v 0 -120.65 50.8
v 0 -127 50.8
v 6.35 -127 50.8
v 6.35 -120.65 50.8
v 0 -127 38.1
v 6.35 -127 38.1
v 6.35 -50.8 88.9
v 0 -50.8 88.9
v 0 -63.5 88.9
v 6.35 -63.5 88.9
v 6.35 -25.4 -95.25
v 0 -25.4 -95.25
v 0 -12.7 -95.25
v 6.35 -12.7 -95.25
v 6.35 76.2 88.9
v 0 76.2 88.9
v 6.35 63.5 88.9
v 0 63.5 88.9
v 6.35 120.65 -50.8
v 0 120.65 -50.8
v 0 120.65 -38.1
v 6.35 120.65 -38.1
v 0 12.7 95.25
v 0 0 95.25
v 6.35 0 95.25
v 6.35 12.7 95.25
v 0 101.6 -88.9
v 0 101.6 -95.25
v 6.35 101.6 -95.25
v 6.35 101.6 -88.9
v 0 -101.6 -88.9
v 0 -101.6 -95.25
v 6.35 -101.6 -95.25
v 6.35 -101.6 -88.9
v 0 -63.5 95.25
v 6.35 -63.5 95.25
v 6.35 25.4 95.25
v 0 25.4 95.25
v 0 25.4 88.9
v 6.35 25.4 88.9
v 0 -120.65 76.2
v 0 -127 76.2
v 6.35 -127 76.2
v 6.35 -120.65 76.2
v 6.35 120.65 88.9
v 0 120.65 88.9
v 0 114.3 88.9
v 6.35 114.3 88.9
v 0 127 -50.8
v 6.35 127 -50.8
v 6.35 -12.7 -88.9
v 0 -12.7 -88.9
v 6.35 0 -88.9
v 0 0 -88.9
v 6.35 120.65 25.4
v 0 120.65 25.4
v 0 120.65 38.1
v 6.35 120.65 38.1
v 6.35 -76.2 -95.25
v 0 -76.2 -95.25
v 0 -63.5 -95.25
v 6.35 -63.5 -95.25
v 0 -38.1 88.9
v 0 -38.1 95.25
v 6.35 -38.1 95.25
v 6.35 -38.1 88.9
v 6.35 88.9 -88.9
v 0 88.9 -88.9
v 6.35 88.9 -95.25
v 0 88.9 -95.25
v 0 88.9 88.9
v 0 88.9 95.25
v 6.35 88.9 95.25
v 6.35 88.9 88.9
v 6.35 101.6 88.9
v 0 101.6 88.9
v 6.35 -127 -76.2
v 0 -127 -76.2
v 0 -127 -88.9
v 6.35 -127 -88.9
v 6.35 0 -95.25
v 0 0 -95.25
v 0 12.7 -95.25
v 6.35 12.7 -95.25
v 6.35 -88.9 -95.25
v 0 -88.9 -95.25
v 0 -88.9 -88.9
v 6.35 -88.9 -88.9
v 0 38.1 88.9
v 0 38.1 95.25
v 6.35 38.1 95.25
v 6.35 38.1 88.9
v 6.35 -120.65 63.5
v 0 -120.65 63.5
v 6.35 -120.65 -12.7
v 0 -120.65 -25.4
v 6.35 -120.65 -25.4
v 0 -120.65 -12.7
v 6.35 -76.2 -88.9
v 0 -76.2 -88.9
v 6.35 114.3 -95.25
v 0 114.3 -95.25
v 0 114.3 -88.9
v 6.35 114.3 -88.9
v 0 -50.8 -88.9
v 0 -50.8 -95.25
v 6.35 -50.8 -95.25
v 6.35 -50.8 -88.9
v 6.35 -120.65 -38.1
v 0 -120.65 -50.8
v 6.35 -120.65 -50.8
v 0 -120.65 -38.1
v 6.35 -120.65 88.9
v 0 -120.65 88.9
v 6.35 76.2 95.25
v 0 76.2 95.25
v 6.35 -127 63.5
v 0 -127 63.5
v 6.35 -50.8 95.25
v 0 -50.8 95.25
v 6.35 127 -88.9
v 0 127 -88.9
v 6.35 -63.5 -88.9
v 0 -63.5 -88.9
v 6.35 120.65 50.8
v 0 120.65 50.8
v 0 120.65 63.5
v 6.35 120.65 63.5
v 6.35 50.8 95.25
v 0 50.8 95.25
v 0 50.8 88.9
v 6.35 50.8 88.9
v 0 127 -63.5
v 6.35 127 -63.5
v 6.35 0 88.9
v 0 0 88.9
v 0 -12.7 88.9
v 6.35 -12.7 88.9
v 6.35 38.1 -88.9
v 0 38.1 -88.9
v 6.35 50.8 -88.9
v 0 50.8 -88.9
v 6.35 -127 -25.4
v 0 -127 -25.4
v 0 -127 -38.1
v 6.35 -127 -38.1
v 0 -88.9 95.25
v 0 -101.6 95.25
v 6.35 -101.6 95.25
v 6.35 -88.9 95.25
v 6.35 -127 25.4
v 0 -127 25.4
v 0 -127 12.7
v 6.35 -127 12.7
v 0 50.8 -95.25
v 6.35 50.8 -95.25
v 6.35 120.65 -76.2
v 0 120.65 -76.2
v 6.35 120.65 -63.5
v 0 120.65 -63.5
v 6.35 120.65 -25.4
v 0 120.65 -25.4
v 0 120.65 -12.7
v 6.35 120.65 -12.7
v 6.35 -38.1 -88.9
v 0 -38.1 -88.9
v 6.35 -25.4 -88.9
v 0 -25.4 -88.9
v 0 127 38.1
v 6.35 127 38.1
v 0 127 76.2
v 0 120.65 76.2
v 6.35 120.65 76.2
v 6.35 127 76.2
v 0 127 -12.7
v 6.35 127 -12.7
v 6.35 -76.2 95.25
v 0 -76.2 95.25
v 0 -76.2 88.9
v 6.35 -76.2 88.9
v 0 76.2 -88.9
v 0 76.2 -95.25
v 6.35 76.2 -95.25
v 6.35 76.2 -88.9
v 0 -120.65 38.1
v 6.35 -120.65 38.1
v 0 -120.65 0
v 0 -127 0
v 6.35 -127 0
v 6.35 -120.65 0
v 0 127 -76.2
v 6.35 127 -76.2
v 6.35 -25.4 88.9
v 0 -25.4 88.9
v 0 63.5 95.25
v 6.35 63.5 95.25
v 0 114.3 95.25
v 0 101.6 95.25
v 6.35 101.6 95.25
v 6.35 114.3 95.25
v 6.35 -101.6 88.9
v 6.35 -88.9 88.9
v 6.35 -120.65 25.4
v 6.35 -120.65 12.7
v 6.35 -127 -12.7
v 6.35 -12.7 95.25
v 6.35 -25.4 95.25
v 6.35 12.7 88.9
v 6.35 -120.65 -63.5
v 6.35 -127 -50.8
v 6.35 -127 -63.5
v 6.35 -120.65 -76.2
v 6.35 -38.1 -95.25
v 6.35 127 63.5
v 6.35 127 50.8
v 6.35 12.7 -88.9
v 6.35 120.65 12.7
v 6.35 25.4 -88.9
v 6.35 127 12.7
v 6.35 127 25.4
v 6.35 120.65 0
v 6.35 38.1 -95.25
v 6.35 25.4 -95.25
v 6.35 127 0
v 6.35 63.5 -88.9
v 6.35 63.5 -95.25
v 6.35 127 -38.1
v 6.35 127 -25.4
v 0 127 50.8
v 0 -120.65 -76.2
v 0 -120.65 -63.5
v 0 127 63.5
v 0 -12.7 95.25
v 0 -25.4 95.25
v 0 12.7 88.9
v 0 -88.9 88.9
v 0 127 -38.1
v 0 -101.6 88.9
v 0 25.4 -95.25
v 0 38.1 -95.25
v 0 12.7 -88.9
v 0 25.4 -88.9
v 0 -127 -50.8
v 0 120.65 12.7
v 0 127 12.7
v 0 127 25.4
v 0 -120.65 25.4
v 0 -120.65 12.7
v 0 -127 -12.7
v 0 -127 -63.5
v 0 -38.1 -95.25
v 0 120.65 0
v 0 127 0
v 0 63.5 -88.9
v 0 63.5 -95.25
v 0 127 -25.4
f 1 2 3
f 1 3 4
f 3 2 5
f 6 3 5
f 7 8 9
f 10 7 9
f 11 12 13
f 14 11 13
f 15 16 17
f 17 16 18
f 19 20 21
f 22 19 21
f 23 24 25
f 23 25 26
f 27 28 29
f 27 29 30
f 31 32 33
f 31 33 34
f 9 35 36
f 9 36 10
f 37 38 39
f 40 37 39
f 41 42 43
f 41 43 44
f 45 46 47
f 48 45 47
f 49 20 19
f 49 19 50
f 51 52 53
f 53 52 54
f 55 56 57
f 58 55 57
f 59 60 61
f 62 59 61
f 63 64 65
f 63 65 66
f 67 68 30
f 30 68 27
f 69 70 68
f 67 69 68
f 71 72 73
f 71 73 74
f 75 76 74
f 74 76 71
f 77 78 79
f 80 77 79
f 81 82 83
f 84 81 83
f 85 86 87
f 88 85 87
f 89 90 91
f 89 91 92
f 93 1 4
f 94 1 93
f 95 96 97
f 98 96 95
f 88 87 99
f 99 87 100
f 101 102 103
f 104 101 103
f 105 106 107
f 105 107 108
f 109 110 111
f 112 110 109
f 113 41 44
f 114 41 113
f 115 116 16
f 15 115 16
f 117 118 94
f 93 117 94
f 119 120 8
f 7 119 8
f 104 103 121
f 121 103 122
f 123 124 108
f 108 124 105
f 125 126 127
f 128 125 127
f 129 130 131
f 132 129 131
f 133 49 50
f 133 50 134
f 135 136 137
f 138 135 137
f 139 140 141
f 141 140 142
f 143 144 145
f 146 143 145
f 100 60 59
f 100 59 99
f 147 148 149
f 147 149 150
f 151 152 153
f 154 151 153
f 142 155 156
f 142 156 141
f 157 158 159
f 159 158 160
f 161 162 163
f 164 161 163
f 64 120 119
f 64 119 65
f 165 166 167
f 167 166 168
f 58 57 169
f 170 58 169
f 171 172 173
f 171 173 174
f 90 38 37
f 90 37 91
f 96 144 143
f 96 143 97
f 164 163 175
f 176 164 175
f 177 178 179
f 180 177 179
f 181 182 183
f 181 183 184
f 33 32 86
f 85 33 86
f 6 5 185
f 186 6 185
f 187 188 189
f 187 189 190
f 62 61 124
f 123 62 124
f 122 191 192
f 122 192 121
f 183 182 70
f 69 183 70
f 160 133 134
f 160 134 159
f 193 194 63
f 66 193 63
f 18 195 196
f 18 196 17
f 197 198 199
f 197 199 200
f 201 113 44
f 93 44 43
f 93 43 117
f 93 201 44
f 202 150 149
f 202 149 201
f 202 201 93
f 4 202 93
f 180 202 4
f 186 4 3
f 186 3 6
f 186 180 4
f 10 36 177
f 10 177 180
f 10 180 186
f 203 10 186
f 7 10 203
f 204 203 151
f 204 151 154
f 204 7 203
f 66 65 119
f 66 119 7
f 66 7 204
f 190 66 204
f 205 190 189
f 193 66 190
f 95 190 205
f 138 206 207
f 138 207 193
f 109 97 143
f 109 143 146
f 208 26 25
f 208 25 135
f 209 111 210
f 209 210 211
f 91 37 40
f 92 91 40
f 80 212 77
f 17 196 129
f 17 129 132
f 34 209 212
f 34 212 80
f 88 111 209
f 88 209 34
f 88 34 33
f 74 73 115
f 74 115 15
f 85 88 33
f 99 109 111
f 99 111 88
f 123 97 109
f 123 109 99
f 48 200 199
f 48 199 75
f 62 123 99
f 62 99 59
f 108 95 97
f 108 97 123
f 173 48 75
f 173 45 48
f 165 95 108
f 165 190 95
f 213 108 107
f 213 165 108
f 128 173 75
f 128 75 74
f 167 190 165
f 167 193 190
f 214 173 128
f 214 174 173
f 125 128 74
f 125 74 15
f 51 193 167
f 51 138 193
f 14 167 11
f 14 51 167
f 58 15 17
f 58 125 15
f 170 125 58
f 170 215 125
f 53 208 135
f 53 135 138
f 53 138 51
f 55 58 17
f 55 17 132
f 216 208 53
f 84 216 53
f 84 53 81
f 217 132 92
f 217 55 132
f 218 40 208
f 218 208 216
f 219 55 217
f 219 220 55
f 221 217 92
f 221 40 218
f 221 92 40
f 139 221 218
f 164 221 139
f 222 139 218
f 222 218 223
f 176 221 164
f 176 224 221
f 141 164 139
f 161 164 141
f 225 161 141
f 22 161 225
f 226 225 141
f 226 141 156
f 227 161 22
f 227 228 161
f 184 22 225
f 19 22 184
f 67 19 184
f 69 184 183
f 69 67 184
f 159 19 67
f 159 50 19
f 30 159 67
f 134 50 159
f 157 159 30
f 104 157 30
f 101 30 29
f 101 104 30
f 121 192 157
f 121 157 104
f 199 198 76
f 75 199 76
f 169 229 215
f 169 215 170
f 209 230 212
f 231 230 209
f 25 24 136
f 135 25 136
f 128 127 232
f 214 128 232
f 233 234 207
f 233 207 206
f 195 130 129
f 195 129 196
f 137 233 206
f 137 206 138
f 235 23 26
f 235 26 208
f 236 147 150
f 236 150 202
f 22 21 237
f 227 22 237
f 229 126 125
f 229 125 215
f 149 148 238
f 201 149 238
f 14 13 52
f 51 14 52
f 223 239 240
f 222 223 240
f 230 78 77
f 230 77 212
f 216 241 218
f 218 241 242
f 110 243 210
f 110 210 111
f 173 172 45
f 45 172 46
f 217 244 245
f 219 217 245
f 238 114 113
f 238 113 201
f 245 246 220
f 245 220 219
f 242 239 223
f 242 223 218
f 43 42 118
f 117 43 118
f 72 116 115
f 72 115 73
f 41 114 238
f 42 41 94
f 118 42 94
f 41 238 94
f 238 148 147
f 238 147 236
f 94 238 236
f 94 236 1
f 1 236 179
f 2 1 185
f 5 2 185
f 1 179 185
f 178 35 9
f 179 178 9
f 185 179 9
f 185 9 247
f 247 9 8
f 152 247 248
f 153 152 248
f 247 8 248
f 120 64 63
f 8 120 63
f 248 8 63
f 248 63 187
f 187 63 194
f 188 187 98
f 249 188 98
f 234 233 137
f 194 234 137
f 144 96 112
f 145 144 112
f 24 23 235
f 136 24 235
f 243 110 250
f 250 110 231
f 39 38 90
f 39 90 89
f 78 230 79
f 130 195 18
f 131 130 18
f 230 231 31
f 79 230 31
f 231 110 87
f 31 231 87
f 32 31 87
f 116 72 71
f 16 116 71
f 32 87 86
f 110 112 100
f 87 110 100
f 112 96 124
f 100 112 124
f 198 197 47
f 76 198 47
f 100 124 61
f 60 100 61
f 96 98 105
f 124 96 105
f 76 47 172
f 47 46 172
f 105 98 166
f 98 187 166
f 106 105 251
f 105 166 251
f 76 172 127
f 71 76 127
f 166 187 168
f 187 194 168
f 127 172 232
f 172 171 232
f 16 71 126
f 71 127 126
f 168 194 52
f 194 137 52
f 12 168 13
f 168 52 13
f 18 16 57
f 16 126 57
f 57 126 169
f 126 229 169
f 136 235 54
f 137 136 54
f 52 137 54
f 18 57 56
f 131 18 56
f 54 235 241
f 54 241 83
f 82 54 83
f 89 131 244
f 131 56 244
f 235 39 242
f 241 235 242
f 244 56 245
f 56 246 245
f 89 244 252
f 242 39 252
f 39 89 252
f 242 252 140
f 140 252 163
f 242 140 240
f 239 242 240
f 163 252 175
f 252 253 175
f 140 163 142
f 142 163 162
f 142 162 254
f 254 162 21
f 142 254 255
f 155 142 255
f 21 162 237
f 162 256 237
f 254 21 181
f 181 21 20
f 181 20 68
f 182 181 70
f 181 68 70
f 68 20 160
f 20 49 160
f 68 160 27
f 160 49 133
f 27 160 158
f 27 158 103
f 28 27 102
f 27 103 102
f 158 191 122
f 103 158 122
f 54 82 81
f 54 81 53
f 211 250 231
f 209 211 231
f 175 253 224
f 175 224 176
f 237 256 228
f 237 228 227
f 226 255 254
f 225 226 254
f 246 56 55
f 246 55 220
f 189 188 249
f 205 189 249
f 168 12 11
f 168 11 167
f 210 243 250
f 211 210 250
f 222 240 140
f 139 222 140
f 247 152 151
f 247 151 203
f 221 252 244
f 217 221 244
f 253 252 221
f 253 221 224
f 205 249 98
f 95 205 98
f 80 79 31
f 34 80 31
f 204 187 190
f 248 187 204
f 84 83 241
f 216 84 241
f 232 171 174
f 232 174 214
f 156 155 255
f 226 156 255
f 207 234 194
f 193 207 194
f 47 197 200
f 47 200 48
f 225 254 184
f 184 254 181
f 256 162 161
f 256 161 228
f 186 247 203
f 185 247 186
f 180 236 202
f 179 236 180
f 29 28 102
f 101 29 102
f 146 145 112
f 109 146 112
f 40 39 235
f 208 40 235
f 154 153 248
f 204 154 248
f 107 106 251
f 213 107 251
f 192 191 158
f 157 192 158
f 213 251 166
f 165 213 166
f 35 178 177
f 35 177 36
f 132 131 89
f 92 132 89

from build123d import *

# Parameters (mm, degrees)
SKETCH1_W               = 190.5
SKETCH1_H               = 254
BOSS_EXTRUDE1_DEPTH     = 6.35
SKETCH2_W               = 6.35
SKETCH2_H               = 12.7
CUT_EXTRUDE1_DEPTH      = 7.35
LPATTERN1_COUNT         = 9
LPATTERN1_PITCH         = 25.4
MIRROR1_COPY_1_SKETCH_W = 6.35
MIRROR1_COPY_1_SKETCH_H = 12.7
MIRROR1_COPY_1_DEPTH    = 7.35
MIRROR1_COPY_2_SKETCH_W = 6.35
MIRROR1_COPY_2_SKETCH_H = 12.7
MIRROR1_COPY_2_DEPTH    = 7.35
MIRROR1_COPY_3_SKETCH_W = 6.35
MIRROR1_COPY_3_SKETCH_H = 12.7
MIRROR1_COPY_3_DEPTH    = 7.35
MIRROR1_COPY_4_SKETCH_W = 6.35
MIRROR1_COPY_4_SKETCH_H = 12.7
MIRROR1_COPY_4_DEPTH    = 7.35
MIRROR1_COPY_5_SKETCH_W = 6.35
MIRROR1_COPY_5_SKETCH_H = 12.7
MIRROR1_COPY_5_DEPTH    = 7.35
MIRROR1_COPY_6_SKETCH_W = 6.35
MIRROR1_COPY_6_SKETCH_H = 12.7
MIRROR1_COPY_6_DEPTH    = 7.35
MIRROR1_COPY_7_SKETCH_W = 6.35
MIRROR1_COPY_7_SKETCH_H = 12.7
MIRROR1_COPY_7_DEPTH    = 7.35
MIRROR1_COPY_8_SKETCH_W = 6.35
MIRROR1_COPY_8_SKETCH_H = 12.7
MIRROR1_COPY_8_DEPTH    = 7.35
SKETCH3_W               = 12.7
SKETCH3_H               = 6.35
CUT_EXTRUDE2_DEPTH      = 7.35
LPATTERN2_COUNT         = 7
LPATTERN2_PITCH         = 25.4
MIRROR2_COPY_1_SKETCH_W = 12.7
MIRROR2_COPY_1_SKETCH_H = 6.35
MIRROR2_COPY_1_DEPTH    = 7.35
MIRROR2_COPY_2_SKETCH_W = 12.7
MIRROR2_COPY_2_SKETCH_H = 6.35
MIRROR2_COPY_2_DEPTH    = 7.35
MIRROR2_COPY_3_SKETCH_W = 12.7
MIRROR2_COPY_3_SKETCH_H = 6.35
MIRROR2_COPY_3_DEPTH    = 7.35
MIRROR2_COPY_4_SKETCH_W = 12.7
MIRROR2_COPY_4_SKETCH_H = 6.35
MIRROR2_COPY_4_DEPTH    = 7.35
MIRROR2_COPY_5_SKETCH_W = 12.7
MIRROR2_COPY_5_SKETCH_H = 6.35
MIRROR2_COPY_5_DEPTH    = 7.35
MIRROR2_COPY_6_SKETCH_W = 12.7
MIRROR2_COPY_6_SKETCH_H = 6.35
MIRROR2_COPY_6_DEPTH    = 7.35
SKETCH4_W               = 6.35
SKETCH4_H               = 25.4
CUT_EXTRUDE3_DEPTH      = 7.35


with BuildPart() as part:
    # Sketch1 → Boss-Extrude1 (new body)
    with BuildSketch(Plane(origin=(0, 0, 0), x_dir=(0, 0, -1), z_dir=(1, 0, 0))):
        Rectangle(SKETCH1_W, SKETCH1_H)
    extrude(amount=BOSS_EXTRUDE1_DEPTH)

    # Sketch2 → Cut-Extrude1 (cut, through all)
    with BuildSketch(Plane.ZY):
        with Locations((-92.075, -82.55)):
            Rectangle(SKETCH2_W, SKETCH2_H)
    cut_extrude1 = extrude(amount=-CUT_EXTRUDE1_DEPTH, mode=Mode.SUBTRACT)

    # LPattern1: Cut-Extrude1 ×9
    with Locations(*[(0, i * LPATTERN1_PITCH, 0) for i in range(1, LPATTERN1_COUNT)]):
        add(cut_extrude1, mode=Mode.SUBTRACT)

    # Mirror1: Cut-Extrude1 across plane
    add(cut_extrude1.mirror(Plane.XY), mode=Mode.SUBTRACT)

    # Mirror1 copy 1 sketch → Mirror1 copy 1 (cut, through all)
    with BuildSketch(Plane(origin=(0, 25.4, 0), x_dir=(0, 0, -1), z_dir=(-1, 0, 0))):
        with Locations((-92.075, 82.55)):
            Rectangle(MIRROR1_COPY_1_SKETCH_W, MIRROR1_COPY_1_SKETCH_H)
    extrude(amount=-MIRROR1_COPY_1_DEPTH, mode=Mode.SUBTRACT)

    # Mirror1 copy 2 sketch → Mirror1 copy 2 (cut, through all)
    with BuildSketch(Plane(origin=(0, 50.8, 0), x_dir=(0, 0, -1), z_dir=(-1, 0, 0))):
        with Locations((-92.075, 82.55)):
            Rectangle(MIRROR1_COPY_2_SKETCH_W, MIRROR1_COPY_2_SKETCH_H)
    extrude(amount=-MIRROR1_COPY_2_DEPTH, mode=Mode.SUBTRACT)

    # Mirror1 copy 3 sketch → Mirror1 copy 3 (cut, through all)
    with BuildSketch(Plane(origin=(0, 76.2, 0), x_dir=(0, 0, -1), z_dir=(-1, 0, 0))):
        with Locations((-92.075, 82.55)):
            Rectangle(MIRROR1_COPY_3_SKETCH_W, MIRROR1_COPY_3_SKETCH_H)
    extrude(amount=-MIRROR1_COPY_3_DEPTH, mode=Mode.SUBTRACT)

    # Mirror1 copy 4 sketch → Mirror1 copy 4 (cut, through all)
    with BuildSketch(Plane(origin=(0, 101.6, 0), x_dir=(0, 0, -1), z_dir=(-1, 0, 0))):
        with Locations((-92.075, 82.55)):
            Rectangle(MIRROR1_COPY_4_SKETCH_W, MIRROR1_COPY_4_SKETCH_H)
    extrude(amount=-MIRROR1_COPY_4_DEPTH, mode=Mode.SUBTRACT)

    # Mirror1 copy 5 sketch → Mirror1 copy 5 (cut, through all)
    with BuildSketch(Plane(origin=(0, 127, 0), x_dir=(0, 0, -1), z_dir=(-1, 0, 0))):
        with Locations((-92.075, 82.55)):
            Rectangle(MIRROR1_COPY_5_SKETCH_W, MIRROR1_COPY_5_SKETCH_H)
    extrude(amount=-MIRROR1_COPY_5_DEPTH, mode=Mode.SUBTRACT)

    # Mirror1 copy 6 sketch → Mirror1 copy 6 (cut, through all)
    with BuildSketch(Plane(origin=(0, 152.4, 0), x_dir=(0, 0, -1), z_dir=(-1, 0, 0))):
        with Locations((-92.075, 82.55)):
            Rectangle(MIRROR1_COPY_6_SKETCH_W, MIRROR1_COPY_6_SKETCH_H)
    extrude(amount=-MIRROR1_COPY_6_DEPTH, mode=Mode.SUBTRACT)

    # Mirror1 copy 7 sketch → Mirror1 copy 7 (cut, through all)
    with BuildSketch(Plane(origin=(0, 177.8, 0), x_dir=(0, 0, -1), z_dir=(-1, 0, 0))):
        with Locations((-92.075, 82.55)):
            Rectangle(MIRROR1_COPY_7_SKETCH_W, MIRROR1_COPY_7_SKETCH_H)
    extrude(amount=-MIRROR1_COPY_7_DEPTH, mode=Mode.SUBTRACT)

    # Mirror1 copy 8 sketch → Mirror1 copy 8 (cut, through all)
    with BuildSketch(Plane(origin=(0, 203.2, 0), x_dir=(0, 0, -1), z_dir=(-1, 0, 0))):
        with Locations((-92.075, 82.55)):
            Rectangle(MIRROR1_COPY_8_SKETCH_W, MIRROR1_COPY_8_SKETCH_H)
    extrude(amount=-MIRROR1_COPY_8_DEPTH, mode=Mode.SUBTRACT)

    # Sketch3 → Cut-Extrude2 (cut, through all)
    with BuildSketch(Plane.ZY):
        with Locations((-69.85, -123.825)):
            Rectangle(SKETCH3_W, SKETCH3_H)
    cut_extrude2 = extrude(amount=-CUT_EXTRUDE2_DEPTH, mode=Mode.SUBTRACT)

    # LPattern2: Cut-Extrude2 ×7
    with Locations(*[(0, 0, i * LPATTERN2_PITCH) for i in range(1, LPATTERN2_COUNT)]):
        add(cut_extrude2, mode=Mode.SUBTRACT)

    # Mirror2: Cut-Extrude2 across plane
    add(cut_extrude2.mirror(Plane.ZX), mode=Mode.SUBTRACT)

    # Mirror2 copy 1 sketch → Mirror2 copy 1 (cut, through all)
    with BuildSketch(Plane(origin=(0, 0, 25.4), x_dir=(0, 0, 1), z_dir=(-1, 0, 0))):
        with Locations((-69.85, 123.825)):
            Rectangle(MIRROR2_COPY_1_SKETCH_W, MIRROR2_COPY_1_SKETCH_H)
    extrude(amount=-MIRROR2_COPY_1_DEPTH, mode=Mode.SUBTRACT)

    # Mirror2 copy 2 sketch → Mirror2 copy 2 (cut, through all)
    with BuildSketch(Plane(origin=(0, 0, 50.8), x_dir=(0, 0, 1), z_dir=(-1, 0, 0))):
        with Locations((-69.85, 123.825)):
            Rectangle(MIRROR2_COPY_2_SKETCH_W, MIRROR2_COPY_2_SKETCH_H)
    extrude(amount=-MIRROR2_COPY_2_DEPTH, mode=Mode.SUBTRACT)

    # Mirror2 copy 3 sketch → Mirror2 copy 3 (cut, through all)
    with BuildSketch(Plane(origin=(0, 0, 76.2), x_dir=(0, 0, 1), z_dir=(-1, 0, 0))):
        with Locations((-69.85, 123.825)):
            Rectangle(MIRROR2_COPY_3_SKETCH_W, MIRROR2_COPY_3_SKETCH_H)
    extrude(amount=-MIRROR2_COPY_3_DEPTH, mode=Mode.SUBTRACT)

    # Mirror2 copy 4 sketch → Mirror2 copy 4 (cut, through all)
    with BuildSketch(Plane(origin=(0, 0, 101.6), x_dir=(0, 0, 1), z_dir=(-1, 0, 0))):
        with Locations((-69.85, 123.825)):
            Rectangle(MIRROR2_COPY_4_SKETCH_W, MIRROR2_COPY_4_SKETCH_H)
    extrude(amount=-MIRROR2_COPY_4_DEPTH, mode=Mode.SUBTRACT)

    # Mirror2 copy 5 sketch → Mirror2 copy 5 (cut, through all)
    with BuildSketch(Plane(origin=(0, 0, 127), x_dir=(0, 0, 1), z_dir=(-1, 0, 0))):
        with Locations((-69.85, 123.825)):
            Rectangle(MIRROR2_COPY_5_SKETCH_W, MIRROR2_COPY_5_SKETCH_H)
    extrude(amount=-MIRROR2_COPY_5_DEPTH, mode=Mode.SUBTRACT)

    # Mirror2 copy 6 sketch → Mirror2 copy 6 (cut, through all)
    with BuildSketch(Plane(origin=(0, 0, 152.4), x_dir=(0, 0, 1), z_dir=(-1, 0, 0))):
        with Locations((-69.85, 123.825)):
            Rectangle(MIRROR2_COPY_6_SKETCH_W, MIRROR2_COPY_6_SKETCH_H)
    extrude(amount=-MIRROR2_COPY_6_DEPTH, mode=Mode.SUBTRACT)

    # Sketch4 → Cut-Extrude3 (cut, through all)
    with BuildSketch(Plane.ZY):
        with Locations((-92.075, -114.3)):
            Rectangle(SKETCH4_W, SKETCH4_H)
    cut_extrude3 = extrude(amount=-CUT_EXTRUDE3_DEPTH, mode=Mode.SUBTRACT)

    # Mirror3: Cut-Extrude3 across plane
    add(cut_extrude3.mirror(Plane.XY), mode=Mode.SUBTRACT)


solid = part.part
